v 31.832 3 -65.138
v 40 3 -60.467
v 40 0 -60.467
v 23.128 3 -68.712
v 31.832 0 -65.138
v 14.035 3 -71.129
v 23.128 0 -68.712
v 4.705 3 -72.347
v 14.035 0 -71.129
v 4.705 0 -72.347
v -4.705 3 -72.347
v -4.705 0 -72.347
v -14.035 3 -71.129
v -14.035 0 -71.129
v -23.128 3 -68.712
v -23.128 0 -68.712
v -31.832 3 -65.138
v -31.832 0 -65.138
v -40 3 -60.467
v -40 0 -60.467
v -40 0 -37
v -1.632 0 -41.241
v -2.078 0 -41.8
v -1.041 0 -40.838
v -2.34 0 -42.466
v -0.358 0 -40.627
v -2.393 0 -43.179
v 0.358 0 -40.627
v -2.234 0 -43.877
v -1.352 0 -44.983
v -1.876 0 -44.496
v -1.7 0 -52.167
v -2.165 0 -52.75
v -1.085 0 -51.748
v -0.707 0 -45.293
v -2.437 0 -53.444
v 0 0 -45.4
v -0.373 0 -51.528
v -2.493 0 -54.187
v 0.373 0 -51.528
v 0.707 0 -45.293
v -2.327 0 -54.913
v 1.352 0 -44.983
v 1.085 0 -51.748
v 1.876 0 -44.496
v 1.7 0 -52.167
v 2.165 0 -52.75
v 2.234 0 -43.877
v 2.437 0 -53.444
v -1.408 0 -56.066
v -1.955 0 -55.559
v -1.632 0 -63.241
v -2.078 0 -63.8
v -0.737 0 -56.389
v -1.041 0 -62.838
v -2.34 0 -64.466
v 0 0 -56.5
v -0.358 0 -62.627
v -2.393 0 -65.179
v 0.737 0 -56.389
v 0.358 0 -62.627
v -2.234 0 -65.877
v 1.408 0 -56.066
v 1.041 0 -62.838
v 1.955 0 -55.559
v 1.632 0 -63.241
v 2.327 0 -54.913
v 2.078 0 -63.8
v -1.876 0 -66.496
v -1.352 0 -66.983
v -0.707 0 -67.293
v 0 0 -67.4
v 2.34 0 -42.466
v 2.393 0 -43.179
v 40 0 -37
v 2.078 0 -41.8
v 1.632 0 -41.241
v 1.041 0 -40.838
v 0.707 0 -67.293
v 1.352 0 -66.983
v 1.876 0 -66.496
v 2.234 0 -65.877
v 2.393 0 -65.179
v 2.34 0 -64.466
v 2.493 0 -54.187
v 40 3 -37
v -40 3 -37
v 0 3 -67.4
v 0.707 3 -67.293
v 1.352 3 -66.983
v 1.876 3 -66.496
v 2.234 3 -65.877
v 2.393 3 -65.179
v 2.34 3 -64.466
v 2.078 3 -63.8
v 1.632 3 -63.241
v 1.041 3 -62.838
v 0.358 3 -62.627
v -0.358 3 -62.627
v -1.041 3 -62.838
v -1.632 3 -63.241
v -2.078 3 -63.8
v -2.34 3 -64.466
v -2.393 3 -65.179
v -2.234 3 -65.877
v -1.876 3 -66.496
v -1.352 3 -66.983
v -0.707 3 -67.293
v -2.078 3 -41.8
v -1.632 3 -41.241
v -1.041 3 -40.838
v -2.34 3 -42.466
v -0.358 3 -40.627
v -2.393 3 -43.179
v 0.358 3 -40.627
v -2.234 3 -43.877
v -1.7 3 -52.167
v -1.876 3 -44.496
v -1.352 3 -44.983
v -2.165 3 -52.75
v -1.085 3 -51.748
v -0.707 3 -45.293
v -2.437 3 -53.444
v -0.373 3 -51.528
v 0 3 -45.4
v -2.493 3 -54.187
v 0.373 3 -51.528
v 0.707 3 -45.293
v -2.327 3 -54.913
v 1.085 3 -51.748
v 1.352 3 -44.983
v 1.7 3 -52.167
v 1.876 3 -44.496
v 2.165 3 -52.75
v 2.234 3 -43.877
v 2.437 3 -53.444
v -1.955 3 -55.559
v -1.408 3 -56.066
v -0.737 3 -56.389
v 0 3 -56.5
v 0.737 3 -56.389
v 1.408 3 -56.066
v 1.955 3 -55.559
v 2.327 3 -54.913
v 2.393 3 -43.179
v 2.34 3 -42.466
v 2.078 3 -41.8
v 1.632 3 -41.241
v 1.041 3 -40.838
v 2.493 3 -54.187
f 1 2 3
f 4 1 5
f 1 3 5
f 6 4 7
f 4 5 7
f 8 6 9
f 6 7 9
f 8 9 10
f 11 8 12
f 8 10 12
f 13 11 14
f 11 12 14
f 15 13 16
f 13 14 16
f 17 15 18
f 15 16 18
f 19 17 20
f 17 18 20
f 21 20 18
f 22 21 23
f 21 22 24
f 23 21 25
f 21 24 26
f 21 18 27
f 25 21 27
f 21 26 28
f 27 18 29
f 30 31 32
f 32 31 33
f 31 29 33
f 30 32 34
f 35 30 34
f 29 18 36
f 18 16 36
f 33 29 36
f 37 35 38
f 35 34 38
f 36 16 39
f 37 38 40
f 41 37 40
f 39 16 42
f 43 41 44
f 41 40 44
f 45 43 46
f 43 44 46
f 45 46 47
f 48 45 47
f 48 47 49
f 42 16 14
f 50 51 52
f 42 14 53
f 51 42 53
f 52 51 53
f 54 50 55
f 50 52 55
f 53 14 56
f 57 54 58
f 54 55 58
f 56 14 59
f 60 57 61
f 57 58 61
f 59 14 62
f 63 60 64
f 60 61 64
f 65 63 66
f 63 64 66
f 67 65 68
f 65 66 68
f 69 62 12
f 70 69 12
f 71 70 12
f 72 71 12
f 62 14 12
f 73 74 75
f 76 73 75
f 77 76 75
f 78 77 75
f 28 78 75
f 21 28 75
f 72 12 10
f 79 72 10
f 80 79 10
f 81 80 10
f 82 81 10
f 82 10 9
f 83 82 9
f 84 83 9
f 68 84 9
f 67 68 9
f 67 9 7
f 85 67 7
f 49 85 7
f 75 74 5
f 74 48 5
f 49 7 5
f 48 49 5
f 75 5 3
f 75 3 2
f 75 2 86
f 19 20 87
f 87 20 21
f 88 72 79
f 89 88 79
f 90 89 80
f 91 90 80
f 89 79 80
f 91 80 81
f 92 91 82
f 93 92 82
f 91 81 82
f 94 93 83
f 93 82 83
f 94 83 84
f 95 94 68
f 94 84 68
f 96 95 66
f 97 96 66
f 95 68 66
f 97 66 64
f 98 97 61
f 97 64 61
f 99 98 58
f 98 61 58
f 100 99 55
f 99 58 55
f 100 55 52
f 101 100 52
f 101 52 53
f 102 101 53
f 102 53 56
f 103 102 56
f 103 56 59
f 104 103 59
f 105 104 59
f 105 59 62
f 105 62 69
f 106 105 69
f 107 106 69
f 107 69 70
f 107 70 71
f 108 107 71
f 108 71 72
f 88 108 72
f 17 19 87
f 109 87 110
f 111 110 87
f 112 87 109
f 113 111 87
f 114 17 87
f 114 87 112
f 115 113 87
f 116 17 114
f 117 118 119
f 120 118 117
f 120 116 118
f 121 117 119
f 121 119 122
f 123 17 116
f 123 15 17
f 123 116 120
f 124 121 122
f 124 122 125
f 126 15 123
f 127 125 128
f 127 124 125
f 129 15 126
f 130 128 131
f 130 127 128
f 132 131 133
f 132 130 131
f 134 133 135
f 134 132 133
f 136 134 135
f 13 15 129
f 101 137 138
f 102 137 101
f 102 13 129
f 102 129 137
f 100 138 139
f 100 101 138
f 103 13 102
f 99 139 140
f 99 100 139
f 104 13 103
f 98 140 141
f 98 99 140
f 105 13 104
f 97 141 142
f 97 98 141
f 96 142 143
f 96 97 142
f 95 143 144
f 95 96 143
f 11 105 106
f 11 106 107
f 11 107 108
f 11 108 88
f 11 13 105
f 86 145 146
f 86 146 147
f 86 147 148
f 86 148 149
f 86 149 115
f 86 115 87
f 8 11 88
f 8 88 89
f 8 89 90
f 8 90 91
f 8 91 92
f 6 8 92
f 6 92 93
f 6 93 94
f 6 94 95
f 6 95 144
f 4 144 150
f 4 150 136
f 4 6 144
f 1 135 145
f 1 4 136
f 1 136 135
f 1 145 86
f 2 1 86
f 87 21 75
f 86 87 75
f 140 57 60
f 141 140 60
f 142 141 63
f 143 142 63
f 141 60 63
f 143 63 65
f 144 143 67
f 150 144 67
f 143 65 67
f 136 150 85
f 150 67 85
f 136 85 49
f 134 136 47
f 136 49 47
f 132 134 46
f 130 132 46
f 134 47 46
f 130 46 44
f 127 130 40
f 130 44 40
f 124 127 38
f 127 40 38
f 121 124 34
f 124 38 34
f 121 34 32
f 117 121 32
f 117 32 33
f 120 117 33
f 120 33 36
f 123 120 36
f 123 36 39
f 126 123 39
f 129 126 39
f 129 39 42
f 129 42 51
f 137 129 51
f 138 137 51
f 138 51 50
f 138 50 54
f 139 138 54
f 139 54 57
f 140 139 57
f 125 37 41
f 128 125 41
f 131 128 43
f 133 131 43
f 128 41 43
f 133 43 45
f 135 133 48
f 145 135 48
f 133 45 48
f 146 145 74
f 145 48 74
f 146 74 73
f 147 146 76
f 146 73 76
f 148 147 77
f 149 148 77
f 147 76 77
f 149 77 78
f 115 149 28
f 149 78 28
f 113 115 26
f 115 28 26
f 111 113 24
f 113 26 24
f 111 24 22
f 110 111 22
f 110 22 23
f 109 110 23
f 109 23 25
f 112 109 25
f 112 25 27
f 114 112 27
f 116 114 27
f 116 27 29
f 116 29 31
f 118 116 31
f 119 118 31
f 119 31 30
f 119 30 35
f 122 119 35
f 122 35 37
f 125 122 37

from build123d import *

# Parameters (mm, degrees)
BOSS_EXTRUDE1_DEPTH  = 3
SKETCH11_OUTSIDE_W   = 186.736
SKETCH11_OUTSIDE_H   = 177.534
SKETCH11_OUTSIDE_W_2 = 80
SKETCH11_OUTSIDE_H_2 = 40
CUT_EXTRUDE13_DEPTH  = 103.574363269
SKETCH12_R           = 2.4
CUT_EXTRUDE15_DEPTH  = 83.856804186
SKETCH13_R           = 2.5
CUT_EXTRUDE16_DEPTH  = 83.856804186


with BuildPart() as part:
    # Sketch1 → Boss-Extrude1 (new body)
    with BuildSketch(Plane(origin=(0, 0, 0), x_dir=(1, 0, 0), z_dir=(0, 1, 0))):
        with BuildLine():
            ThreePointArc((36.543377003, -62.616544118), (0, 72.5), (-36.543377003, -62.616544118))
            ThreePointArc((-36.543377003, -62.616544118), (-33.085954668, -63.20954405), (-30.089832649, -61.38507948))
            ThreePointArc((-30.089832649, -61.38507948), (0, -46.75), (30.089832649, -61.38507948))
            ThreePointArc((30.089832649, -61.38507948), (33.085954668, -63.20954405), (36.543377003, -62.616544118))
        make_face()
    extrude(amount=BOSS_EXTRUDE1_DEPTH)

    # Sketch11 outside → Cut-Extrude13 (cut, through all)
    with BuildSketch(Plane.XZ):
        with Locations((0, -4.601)):
            Rectangle(SKETCH11_OUTSIDE_W, SKETCH11_OUTSIDE_H)
        with Locations((0, -57)):
            Rectangle(SKETCH11_OUTSIDE_W_2, SKETCH11_OUTSIDE_H_2, mode=Mode.SUBTRACT)
    extrude(amount=-CUT_EXTRUDE13_DEPTH, mode=Mode.SUBTRACT)

    # Sketch12 → Cut-Extrude15 (cut, through all)
    with BuildSketch(Plane.XZ):
        with Locations(Location((0, -65, 0), (0, 0, 270))):
            Circle(SKETCH12_R)
        with Locations(Location((0, -43, 0), (0, 0, 270))):
            Circle(SKETCH12_R)
    extrude(amount=-CUT_EXTRUDE15_DEPTH, mode=Mode.SUBTRACT)

    # Sketch13 → Cut-Extrude16 (cut, through all)
    with BuildSketch(Plane.XZ):
        with Locations(Location((0, -54, 0), (0, 0, 270))):
            Circle(SKETCH13_R)
    extrude(amount=-CUT_EXTRUDE16_DEPTH, mode=Mode.SUBTRACT)


solid = part.part
